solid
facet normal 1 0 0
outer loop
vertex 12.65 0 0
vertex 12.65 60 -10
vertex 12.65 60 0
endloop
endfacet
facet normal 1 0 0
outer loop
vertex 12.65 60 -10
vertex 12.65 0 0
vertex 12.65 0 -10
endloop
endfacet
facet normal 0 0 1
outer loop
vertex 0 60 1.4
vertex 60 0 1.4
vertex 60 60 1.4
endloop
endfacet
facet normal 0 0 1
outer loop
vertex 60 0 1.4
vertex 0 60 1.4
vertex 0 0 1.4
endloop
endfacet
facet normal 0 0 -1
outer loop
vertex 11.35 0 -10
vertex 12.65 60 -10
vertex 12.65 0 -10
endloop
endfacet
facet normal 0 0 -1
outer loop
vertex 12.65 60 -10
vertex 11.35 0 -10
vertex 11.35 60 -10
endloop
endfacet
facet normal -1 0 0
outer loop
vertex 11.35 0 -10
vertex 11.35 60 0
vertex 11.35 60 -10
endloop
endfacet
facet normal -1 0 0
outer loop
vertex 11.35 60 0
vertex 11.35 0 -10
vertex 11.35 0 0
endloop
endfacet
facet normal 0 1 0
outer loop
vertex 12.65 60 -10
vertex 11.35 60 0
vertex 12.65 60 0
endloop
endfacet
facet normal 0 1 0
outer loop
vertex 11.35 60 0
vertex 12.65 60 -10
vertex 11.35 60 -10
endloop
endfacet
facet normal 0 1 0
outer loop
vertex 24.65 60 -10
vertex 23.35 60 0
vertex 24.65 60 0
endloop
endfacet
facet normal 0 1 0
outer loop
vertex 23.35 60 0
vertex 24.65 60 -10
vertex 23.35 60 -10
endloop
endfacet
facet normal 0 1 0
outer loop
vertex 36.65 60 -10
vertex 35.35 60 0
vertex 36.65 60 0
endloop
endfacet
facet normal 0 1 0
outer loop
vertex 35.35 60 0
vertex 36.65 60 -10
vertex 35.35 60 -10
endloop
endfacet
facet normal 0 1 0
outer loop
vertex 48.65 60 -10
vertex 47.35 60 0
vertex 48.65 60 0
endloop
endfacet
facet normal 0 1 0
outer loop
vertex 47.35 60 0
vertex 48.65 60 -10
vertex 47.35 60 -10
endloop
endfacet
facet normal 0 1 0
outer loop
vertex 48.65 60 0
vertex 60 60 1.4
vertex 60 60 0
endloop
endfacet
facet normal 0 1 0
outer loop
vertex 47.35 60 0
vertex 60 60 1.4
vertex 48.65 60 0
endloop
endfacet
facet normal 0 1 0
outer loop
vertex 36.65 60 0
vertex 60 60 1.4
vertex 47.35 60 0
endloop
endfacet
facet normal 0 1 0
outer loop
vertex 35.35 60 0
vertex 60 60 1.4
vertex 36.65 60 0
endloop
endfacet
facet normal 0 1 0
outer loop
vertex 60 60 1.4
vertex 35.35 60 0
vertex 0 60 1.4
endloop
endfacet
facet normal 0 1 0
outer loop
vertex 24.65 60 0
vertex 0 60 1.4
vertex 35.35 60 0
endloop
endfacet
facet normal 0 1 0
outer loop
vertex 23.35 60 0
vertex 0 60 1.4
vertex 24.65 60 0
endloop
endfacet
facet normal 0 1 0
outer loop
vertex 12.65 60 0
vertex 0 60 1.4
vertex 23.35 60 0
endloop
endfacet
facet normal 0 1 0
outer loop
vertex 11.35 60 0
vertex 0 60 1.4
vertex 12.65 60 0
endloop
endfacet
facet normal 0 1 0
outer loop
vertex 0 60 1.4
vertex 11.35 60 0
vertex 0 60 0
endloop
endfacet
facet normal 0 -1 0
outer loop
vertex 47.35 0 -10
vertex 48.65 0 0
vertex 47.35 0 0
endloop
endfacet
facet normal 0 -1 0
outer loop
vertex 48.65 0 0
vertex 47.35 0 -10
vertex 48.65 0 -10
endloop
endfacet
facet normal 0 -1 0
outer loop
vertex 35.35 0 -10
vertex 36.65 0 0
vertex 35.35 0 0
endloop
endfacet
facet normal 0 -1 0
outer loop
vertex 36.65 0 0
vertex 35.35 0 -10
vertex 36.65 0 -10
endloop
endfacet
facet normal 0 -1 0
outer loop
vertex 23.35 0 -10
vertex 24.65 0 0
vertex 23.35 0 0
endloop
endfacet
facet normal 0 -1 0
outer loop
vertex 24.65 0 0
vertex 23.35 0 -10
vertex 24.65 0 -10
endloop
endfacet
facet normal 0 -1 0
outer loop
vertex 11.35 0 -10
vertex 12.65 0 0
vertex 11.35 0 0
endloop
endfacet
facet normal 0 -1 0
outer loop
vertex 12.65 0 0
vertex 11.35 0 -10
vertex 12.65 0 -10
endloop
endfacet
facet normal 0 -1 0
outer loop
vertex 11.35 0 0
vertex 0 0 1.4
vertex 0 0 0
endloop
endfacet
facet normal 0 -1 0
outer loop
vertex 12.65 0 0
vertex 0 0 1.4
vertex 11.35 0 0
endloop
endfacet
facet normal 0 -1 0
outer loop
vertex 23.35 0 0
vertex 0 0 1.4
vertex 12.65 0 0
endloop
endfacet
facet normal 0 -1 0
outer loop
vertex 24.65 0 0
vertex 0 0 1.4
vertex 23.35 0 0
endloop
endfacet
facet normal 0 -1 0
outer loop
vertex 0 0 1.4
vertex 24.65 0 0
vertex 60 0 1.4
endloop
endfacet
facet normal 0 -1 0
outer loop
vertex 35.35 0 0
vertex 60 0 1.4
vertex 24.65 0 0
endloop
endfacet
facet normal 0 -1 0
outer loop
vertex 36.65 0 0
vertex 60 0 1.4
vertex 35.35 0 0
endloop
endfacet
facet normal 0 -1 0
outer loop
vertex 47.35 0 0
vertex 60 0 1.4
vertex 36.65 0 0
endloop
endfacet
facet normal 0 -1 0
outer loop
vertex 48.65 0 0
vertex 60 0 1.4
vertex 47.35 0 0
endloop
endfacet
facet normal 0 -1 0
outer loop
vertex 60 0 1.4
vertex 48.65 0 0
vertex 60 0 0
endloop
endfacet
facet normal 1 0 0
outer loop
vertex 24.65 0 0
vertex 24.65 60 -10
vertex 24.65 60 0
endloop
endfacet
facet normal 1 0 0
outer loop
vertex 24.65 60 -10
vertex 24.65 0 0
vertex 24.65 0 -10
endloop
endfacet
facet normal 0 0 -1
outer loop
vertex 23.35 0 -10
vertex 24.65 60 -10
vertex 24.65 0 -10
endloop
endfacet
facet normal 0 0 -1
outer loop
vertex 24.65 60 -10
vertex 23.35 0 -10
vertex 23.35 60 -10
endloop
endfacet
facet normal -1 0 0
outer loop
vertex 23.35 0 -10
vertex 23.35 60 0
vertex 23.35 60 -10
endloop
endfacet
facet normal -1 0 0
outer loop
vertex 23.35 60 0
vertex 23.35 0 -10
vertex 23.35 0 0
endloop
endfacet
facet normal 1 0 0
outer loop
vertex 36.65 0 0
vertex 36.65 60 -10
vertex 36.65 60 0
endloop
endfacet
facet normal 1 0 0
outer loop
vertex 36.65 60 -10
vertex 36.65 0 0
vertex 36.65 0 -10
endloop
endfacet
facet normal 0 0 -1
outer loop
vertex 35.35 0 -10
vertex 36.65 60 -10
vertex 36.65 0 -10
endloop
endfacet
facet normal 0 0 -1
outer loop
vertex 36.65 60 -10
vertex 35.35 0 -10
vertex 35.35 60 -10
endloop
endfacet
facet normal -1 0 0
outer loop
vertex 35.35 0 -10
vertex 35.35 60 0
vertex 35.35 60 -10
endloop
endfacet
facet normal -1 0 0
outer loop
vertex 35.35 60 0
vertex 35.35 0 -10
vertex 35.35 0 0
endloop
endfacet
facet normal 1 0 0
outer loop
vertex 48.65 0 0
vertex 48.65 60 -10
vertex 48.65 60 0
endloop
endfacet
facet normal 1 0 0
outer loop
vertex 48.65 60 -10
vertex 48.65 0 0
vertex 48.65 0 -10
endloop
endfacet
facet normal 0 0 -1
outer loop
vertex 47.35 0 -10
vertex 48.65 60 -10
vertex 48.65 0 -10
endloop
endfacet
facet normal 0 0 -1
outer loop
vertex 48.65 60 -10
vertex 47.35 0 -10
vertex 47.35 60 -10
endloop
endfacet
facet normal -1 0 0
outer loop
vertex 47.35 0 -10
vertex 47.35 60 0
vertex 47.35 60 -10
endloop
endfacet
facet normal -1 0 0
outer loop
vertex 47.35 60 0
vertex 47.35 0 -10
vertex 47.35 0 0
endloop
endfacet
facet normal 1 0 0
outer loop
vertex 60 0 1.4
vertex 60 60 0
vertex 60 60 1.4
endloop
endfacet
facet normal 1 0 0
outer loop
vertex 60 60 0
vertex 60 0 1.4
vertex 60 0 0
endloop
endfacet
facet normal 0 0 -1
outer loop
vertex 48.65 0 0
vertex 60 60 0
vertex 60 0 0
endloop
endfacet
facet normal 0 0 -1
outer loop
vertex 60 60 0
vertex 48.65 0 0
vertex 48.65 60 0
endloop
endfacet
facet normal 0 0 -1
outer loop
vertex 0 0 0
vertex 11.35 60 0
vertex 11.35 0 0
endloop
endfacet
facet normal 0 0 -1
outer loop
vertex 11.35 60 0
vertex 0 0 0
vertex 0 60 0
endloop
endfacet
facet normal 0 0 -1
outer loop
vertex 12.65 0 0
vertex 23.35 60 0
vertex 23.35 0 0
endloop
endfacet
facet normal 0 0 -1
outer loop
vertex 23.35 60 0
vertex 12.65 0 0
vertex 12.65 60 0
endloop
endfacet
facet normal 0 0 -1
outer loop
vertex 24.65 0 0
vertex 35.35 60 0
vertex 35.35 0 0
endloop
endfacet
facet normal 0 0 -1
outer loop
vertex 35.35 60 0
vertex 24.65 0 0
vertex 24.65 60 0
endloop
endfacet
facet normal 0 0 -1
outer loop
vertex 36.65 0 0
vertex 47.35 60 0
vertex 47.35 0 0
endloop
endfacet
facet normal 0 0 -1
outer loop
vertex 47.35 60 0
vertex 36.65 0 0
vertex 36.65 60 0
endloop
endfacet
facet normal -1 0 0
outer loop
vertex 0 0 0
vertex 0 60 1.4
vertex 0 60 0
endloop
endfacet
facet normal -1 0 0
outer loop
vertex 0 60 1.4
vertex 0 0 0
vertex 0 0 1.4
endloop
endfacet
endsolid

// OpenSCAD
$fn = 32;

// ----------------------------------------------------------------------
// Ribbed panel: 1.4 mm panel
// ----------------------------------------------------------------------

// --- parameters (mm) ---
panel_l = 60;             // panel length, X
panel_w = 60;             // panel width, Y
panel_t = 1.4;            // panel thickness, Z
rib_t = 1.3;              // rib thickness
rib_h = 10;               // rib height below the panel
ribs = 4;                 // number of ribs

total_h = panel_t + rib_h;  // overall height

union() {
  cube([panel_l, panel_w, panel_t]);
  for (i = [1 : ribs])
    translate([i * panel_l / (ribs + 1) - rib_t / 2, 0, -rib_h])
      cube([rib_t, panel_w, rib_h + panel_t]);
}
